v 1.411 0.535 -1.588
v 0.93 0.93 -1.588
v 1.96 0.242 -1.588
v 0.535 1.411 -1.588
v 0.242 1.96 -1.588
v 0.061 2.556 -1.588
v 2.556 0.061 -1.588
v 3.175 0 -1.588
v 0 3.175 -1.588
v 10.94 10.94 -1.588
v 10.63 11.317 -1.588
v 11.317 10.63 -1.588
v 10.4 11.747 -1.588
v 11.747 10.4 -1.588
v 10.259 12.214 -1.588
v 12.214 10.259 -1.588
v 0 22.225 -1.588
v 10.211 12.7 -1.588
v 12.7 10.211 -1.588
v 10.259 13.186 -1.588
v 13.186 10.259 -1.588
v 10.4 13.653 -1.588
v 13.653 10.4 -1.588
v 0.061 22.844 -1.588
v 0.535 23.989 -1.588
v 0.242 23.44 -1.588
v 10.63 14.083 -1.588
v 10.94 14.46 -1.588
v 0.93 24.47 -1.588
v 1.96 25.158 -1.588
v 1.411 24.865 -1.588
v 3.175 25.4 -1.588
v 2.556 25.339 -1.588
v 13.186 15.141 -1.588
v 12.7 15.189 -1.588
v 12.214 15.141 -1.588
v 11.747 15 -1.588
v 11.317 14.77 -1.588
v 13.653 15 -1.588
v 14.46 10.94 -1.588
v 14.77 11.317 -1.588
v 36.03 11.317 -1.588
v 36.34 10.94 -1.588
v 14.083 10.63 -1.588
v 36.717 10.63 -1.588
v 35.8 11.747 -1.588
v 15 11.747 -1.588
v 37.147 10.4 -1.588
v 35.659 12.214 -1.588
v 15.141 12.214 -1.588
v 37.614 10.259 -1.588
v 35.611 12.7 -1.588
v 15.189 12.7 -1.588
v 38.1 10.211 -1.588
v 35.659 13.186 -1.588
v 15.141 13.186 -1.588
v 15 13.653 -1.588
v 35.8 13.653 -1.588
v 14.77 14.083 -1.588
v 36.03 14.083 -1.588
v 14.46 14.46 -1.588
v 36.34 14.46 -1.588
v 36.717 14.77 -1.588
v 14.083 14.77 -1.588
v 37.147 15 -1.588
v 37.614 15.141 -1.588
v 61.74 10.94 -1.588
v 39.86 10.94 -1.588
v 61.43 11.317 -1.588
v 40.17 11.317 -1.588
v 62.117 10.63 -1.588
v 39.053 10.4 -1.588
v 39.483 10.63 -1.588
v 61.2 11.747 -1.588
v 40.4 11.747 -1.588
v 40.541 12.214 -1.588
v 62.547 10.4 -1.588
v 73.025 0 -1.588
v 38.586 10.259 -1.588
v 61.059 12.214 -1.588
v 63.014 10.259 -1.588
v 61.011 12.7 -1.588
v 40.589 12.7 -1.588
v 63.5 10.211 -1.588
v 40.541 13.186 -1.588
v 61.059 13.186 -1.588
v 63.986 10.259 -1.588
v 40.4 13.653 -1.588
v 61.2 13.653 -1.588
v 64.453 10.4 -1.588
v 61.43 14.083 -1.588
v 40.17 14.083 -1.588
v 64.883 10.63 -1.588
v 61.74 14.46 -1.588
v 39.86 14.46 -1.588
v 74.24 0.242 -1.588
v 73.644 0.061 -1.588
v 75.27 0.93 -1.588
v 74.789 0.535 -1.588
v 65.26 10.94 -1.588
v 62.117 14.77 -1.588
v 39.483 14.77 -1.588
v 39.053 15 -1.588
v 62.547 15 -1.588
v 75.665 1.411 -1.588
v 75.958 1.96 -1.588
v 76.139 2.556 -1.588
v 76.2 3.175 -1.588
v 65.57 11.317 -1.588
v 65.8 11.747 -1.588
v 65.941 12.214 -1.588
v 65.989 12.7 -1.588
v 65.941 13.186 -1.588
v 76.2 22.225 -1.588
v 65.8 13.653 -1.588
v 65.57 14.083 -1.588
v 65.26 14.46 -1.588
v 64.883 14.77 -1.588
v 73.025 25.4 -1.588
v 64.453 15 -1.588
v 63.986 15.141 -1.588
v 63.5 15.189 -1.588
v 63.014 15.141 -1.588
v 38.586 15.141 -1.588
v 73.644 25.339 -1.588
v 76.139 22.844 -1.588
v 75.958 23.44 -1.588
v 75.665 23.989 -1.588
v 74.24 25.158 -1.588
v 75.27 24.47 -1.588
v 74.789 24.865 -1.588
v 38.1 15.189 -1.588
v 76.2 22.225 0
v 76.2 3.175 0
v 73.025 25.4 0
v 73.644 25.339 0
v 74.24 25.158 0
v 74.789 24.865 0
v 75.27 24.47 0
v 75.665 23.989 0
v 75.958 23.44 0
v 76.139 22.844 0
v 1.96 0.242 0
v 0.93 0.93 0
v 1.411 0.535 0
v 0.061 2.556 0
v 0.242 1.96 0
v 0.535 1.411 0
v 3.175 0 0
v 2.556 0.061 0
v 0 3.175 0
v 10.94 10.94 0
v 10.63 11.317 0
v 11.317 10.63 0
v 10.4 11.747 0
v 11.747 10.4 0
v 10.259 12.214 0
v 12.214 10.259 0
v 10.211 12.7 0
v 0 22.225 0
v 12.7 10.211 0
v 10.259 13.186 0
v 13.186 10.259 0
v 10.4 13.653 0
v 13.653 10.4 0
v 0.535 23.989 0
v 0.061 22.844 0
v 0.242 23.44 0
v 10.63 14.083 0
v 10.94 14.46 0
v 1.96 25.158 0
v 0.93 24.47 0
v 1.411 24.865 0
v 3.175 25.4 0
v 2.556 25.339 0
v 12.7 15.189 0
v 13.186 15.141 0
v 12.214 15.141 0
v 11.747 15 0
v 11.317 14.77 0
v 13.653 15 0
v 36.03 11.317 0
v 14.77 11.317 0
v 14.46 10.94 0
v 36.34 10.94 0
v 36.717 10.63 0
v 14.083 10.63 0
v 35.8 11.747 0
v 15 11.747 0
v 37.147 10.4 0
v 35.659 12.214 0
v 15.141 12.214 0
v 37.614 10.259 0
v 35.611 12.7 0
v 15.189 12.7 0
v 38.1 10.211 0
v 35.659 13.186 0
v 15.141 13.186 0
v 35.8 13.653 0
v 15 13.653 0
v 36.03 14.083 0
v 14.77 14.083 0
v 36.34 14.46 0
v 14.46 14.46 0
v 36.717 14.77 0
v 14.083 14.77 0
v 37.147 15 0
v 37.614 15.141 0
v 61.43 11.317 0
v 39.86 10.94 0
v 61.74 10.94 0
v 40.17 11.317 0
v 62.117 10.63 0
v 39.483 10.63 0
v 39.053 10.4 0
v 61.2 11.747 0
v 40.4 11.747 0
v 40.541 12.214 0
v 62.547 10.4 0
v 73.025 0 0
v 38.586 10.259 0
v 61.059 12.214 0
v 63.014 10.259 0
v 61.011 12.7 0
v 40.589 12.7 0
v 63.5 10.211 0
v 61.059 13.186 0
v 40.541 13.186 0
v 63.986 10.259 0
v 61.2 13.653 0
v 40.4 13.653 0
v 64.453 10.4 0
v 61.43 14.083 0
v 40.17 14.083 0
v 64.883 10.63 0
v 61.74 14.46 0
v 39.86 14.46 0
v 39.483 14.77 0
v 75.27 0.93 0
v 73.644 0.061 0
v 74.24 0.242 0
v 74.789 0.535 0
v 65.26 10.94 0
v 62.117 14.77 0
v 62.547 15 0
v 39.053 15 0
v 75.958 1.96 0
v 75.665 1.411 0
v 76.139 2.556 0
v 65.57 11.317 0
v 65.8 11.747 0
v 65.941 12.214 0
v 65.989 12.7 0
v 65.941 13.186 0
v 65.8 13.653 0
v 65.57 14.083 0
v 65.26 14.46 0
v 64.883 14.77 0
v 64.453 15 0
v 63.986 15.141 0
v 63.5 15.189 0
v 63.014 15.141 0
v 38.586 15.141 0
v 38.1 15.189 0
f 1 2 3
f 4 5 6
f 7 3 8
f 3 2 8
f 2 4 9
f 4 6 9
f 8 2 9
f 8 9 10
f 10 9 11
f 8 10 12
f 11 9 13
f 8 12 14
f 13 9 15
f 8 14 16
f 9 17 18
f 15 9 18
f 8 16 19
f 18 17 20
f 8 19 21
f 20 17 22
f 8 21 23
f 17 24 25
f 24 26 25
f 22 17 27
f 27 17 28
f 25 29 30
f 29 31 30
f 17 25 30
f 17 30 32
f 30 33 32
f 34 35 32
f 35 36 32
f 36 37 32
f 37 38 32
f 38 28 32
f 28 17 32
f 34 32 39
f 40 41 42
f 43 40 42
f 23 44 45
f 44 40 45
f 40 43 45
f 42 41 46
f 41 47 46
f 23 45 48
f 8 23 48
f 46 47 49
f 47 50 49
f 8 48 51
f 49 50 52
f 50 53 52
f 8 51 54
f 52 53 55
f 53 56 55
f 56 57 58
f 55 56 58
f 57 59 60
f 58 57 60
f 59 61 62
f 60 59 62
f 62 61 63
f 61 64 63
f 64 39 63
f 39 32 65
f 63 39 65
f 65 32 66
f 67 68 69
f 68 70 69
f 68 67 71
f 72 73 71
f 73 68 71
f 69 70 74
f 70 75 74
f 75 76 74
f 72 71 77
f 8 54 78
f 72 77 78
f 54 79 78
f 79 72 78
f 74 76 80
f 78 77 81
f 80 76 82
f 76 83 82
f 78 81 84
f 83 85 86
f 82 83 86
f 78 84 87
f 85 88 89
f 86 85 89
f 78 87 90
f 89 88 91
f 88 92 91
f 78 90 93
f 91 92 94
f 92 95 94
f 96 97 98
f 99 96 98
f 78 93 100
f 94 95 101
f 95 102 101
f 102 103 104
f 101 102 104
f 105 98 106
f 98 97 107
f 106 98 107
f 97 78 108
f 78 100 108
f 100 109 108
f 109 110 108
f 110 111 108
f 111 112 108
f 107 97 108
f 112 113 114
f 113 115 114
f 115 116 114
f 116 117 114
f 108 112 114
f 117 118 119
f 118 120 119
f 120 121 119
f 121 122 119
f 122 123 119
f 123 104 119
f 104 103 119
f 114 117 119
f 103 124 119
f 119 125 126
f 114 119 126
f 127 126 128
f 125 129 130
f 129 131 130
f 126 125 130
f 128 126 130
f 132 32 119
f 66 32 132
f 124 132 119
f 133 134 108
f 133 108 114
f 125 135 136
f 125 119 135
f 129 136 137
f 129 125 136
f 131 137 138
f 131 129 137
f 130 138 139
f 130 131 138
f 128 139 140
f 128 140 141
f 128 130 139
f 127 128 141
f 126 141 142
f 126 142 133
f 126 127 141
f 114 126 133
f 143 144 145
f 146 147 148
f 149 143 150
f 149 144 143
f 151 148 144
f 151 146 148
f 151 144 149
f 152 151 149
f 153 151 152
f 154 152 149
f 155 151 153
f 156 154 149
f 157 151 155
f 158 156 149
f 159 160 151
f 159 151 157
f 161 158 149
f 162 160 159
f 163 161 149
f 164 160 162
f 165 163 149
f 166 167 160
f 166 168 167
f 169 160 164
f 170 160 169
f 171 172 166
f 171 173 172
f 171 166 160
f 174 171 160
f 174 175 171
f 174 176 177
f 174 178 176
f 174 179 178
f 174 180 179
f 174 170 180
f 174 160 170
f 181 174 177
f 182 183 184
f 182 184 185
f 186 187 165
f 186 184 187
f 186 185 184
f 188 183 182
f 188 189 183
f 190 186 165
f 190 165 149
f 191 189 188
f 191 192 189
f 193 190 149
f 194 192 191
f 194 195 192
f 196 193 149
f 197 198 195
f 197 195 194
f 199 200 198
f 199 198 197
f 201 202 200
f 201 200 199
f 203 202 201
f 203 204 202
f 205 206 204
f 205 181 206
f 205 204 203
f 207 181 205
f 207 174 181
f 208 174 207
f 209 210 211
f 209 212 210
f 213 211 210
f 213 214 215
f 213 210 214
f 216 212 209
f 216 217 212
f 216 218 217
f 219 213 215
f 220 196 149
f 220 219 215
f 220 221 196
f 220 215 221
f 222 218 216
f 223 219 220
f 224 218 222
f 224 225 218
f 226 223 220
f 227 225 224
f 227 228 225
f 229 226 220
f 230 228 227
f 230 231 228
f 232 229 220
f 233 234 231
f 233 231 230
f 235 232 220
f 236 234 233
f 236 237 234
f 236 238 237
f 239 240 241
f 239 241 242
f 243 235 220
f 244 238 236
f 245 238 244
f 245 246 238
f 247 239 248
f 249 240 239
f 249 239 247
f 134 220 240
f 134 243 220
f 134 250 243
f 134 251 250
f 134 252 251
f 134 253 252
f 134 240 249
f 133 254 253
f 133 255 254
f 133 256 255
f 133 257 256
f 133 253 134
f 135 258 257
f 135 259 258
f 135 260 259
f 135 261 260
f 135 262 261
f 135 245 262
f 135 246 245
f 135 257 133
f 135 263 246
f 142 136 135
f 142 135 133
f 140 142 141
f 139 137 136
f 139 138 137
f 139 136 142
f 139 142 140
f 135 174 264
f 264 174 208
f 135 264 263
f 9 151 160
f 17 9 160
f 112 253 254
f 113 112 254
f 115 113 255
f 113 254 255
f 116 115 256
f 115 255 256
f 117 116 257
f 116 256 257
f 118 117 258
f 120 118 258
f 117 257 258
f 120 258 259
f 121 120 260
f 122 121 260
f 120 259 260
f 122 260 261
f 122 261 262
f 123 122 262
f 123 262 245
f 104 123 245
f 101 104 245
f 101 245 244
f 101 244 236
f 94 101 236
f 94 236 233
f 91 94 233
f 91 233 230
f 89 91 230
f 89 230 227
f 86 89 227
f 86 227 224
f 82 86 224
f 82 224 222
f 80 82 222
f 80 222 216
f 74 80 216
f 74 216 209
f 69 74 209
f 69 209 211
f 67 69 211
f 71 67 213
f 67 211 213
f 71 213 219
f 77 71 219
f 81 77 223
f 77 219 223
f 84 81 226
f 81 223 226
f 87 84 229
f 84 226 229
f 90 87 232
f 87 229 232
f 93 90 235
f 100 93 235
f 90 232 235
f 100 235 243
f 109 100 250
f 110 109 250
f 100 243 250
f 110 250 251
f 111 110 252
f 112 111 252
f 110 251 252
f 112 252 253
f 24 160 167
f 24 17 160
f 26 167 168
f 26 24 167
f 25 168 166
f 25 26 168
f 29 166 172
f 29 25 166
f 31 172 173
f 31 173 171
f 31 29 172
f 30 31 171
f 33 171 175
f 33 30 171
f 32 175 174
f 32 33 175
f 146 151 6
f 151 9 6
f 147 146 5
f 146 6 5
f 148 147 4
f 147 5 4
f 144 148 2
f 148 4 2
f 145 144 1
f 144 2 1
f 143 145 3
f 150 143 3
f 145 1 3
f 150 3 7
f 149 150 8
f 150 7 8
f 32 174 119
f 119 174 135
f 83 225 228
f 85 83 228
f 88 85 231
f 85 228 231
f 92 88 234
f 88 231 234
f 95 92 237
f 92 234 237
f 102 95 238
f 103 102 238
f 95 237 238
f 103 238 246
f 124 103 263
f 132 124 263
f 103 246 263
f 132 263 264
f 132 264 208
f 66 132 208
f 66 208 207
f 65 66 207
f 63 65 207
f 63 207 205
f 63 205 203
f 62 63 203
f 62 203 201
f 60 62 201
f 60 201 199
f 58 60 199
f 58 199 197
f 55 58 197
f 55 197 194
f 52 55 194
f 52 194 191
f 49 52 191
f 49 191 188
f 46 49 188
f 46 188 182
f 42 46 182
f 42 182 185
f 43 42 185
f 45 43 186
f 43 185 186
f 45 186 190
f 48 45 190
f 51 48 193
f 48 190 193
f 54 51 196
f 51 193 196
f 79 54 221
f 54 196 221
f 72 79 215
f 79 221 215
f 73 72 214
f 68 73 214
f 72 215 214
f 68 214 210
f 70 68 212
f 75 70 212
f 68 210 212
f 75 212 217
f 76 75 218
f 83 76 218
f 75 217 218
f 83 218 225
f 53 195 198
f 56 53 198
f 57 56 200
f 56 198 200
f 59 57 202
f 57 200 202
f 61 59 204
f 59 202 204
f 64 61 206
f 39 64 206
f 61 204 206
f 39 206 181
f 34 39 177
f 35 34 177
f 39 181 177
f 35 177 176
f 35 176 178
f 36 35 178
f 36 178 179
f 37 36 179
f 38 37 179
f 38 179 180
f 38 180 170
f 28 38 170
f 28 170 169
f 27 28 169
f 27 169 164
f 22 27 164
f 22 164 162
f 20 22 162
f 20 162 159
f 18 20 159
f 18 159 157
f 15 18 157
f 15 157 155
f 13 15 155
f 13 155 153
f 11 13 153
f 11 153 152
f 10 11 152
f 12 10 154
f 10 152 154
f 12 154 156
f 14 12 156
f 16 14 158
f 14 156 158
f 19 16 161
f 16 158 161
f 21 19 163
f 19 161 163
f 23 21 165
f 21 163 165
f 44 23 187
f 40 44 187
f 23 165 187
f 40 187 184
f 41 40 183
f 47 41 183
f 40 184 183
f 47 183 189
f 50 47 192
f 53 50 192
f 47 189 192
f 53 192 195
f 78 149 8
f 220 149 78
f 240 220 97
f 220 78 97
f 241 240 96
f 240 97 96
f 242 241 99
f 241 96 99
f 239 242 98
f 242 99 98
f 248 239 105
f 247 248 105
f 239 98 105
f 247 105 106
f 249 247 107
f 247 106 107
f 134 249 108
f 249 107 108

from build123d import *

# Parameters (mm, degrees)
SKETCH1_W           = 76.2
SKETCH1_H           = 25.4
BOSS_EXTRUDE1_DEPTH = 1.5875
SKETCH2_R           = 2.4892
CUT_EXTRUDE1_DEPTH  = 81.337538898
FILLET1_R           = 3.175


with BuildPart() as part:
    # Sketch1 → Boss-Extrude1 (new body)
    with BuildSketch(Plane.XY):
        with Locations((38.1, 12.7)):
            Rectangle(SKETCH1_W, SKETCH1_H)
    extrude(amount=-BOSS_EXTRUDE1_DEPTH)

    # Sketch2 → Cut-Extrude1 (cut, through all)
    with BuildSketch(Plane.XY):
        with Locations((12.7, 12.7)):
            Circle(SKETCH2_R)
        with Locations((38.1, 12.7)):
            Circle(SKETCH2_R)
        with Locations((63.5, 12.7)):
            Circle(SKETCH2_R)
        with Locations((88.9, 12.7)):
            Circle(SKETCH2_R)
        with Locations((114.3, 12.7)):
            Circle(SKETCH2_R)
    extrude(amount=-CUT_EXTRUDE1_DEPTH, mode=Mode.SUBTRACT)

    # Fillet1
    fillet1_edges = [part.edges().sort_by_distance(p)[0] for p in [
        (0, 25.4, -0.79375),
        (76.2, 25.4, -0.79375),
        (76.2, 0, -0.79375),
        (0, 0, -0.79375),
    ]]
    fillet(fillet1_edges, radius=FILLET1_R)


solid = part.part
